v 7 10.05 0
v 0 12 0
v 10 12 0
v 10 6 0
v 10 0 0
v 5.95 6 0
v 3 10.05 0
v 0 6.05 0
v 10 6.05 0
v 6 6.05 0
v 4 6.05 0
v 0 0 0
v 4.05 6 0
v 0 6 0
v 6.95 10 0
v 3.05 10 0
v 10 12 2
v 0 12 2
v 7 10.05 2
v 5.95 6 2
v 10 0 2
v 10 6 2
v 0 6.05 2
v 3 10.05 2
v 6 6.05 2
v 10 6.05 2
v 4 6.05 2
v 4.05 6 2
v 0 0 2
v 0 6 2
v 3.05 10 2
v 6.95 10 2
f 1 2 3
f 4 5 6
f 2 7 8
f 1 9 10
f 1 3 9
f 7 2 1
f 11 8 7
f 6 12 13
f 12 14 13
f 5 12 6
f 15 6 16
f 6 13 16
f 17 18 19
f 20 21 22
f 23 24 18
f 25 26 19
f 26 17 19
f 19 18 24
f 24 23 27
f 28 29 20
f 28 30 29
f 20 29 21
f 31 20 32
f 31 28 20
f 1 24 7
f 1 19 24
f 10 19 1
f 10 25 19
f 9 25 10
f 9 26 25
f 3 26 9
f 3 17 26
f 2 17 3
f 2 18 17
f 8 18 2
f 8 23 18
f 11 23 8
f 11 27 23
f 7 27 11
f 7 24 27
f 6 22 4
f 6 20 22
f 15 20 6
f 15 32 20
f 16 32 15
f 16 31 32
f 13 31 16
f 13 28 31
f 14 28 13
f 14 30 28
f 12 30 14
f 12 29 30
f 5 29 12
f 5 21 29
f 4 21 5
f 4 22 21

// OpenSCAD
/*
 * @file parametric_short_example.scad
 * @brief Short example of a parametric model
 * @copyright Cameron K. Brooks 2025
 * @license CC-BY-SA-4.0
 * @details This is a short example of a parametric model that creates a dovetail joint.
 */

X = 10; // Width of the base
Y = 6; // Length of the object

A = 4; // Length of the dovetail
B = 2; // Width of the top edge of the dovetail
C = 4; // Width of the lower edge of the dovetail
D = 0.1; // Delta value for allowance

H = 2; // Height of the object

// Module to define a 2D polygon
module base_shape(X, Y, A, B, C, D, M = false) {
  AA = M ? A : -A; // Invert the dovetail if female
  BB = M ? B - D : B; // Apply allowance to male B dimension
  CC = M ? C - D : C; // Apply allowance to male C dimension
  polygon(
    points=[
      [0, 0], // Bottom-left corner
      [X, 0], // Bottom-right corner
      [X, Y], // Top-right corner
      [X / 2 - BB / 2, Y], // Top-right corner of the dovetail
      [X / 2 - CC / 2, Y + AA], // Bottom-right corner of the dovetail
      [X / 2 + CC / 2, Y + AA], // Bottom-left corner of the dovetail
      [X / 2 + BB / 2, Y], // Top-left corner of the dovetail
      [0, Y], // Top-left corner
    ]
  );
}

// Linear extrusion to create the 3D object
linear_extrude(H) {
  base_shape(X, Y, A, B, C, D, true);
  mirror([0, 1, 0]) translate([0, -Y * 2, 0]) base_shape(X, Y - D / 2, A, B, C, D, false);
}
